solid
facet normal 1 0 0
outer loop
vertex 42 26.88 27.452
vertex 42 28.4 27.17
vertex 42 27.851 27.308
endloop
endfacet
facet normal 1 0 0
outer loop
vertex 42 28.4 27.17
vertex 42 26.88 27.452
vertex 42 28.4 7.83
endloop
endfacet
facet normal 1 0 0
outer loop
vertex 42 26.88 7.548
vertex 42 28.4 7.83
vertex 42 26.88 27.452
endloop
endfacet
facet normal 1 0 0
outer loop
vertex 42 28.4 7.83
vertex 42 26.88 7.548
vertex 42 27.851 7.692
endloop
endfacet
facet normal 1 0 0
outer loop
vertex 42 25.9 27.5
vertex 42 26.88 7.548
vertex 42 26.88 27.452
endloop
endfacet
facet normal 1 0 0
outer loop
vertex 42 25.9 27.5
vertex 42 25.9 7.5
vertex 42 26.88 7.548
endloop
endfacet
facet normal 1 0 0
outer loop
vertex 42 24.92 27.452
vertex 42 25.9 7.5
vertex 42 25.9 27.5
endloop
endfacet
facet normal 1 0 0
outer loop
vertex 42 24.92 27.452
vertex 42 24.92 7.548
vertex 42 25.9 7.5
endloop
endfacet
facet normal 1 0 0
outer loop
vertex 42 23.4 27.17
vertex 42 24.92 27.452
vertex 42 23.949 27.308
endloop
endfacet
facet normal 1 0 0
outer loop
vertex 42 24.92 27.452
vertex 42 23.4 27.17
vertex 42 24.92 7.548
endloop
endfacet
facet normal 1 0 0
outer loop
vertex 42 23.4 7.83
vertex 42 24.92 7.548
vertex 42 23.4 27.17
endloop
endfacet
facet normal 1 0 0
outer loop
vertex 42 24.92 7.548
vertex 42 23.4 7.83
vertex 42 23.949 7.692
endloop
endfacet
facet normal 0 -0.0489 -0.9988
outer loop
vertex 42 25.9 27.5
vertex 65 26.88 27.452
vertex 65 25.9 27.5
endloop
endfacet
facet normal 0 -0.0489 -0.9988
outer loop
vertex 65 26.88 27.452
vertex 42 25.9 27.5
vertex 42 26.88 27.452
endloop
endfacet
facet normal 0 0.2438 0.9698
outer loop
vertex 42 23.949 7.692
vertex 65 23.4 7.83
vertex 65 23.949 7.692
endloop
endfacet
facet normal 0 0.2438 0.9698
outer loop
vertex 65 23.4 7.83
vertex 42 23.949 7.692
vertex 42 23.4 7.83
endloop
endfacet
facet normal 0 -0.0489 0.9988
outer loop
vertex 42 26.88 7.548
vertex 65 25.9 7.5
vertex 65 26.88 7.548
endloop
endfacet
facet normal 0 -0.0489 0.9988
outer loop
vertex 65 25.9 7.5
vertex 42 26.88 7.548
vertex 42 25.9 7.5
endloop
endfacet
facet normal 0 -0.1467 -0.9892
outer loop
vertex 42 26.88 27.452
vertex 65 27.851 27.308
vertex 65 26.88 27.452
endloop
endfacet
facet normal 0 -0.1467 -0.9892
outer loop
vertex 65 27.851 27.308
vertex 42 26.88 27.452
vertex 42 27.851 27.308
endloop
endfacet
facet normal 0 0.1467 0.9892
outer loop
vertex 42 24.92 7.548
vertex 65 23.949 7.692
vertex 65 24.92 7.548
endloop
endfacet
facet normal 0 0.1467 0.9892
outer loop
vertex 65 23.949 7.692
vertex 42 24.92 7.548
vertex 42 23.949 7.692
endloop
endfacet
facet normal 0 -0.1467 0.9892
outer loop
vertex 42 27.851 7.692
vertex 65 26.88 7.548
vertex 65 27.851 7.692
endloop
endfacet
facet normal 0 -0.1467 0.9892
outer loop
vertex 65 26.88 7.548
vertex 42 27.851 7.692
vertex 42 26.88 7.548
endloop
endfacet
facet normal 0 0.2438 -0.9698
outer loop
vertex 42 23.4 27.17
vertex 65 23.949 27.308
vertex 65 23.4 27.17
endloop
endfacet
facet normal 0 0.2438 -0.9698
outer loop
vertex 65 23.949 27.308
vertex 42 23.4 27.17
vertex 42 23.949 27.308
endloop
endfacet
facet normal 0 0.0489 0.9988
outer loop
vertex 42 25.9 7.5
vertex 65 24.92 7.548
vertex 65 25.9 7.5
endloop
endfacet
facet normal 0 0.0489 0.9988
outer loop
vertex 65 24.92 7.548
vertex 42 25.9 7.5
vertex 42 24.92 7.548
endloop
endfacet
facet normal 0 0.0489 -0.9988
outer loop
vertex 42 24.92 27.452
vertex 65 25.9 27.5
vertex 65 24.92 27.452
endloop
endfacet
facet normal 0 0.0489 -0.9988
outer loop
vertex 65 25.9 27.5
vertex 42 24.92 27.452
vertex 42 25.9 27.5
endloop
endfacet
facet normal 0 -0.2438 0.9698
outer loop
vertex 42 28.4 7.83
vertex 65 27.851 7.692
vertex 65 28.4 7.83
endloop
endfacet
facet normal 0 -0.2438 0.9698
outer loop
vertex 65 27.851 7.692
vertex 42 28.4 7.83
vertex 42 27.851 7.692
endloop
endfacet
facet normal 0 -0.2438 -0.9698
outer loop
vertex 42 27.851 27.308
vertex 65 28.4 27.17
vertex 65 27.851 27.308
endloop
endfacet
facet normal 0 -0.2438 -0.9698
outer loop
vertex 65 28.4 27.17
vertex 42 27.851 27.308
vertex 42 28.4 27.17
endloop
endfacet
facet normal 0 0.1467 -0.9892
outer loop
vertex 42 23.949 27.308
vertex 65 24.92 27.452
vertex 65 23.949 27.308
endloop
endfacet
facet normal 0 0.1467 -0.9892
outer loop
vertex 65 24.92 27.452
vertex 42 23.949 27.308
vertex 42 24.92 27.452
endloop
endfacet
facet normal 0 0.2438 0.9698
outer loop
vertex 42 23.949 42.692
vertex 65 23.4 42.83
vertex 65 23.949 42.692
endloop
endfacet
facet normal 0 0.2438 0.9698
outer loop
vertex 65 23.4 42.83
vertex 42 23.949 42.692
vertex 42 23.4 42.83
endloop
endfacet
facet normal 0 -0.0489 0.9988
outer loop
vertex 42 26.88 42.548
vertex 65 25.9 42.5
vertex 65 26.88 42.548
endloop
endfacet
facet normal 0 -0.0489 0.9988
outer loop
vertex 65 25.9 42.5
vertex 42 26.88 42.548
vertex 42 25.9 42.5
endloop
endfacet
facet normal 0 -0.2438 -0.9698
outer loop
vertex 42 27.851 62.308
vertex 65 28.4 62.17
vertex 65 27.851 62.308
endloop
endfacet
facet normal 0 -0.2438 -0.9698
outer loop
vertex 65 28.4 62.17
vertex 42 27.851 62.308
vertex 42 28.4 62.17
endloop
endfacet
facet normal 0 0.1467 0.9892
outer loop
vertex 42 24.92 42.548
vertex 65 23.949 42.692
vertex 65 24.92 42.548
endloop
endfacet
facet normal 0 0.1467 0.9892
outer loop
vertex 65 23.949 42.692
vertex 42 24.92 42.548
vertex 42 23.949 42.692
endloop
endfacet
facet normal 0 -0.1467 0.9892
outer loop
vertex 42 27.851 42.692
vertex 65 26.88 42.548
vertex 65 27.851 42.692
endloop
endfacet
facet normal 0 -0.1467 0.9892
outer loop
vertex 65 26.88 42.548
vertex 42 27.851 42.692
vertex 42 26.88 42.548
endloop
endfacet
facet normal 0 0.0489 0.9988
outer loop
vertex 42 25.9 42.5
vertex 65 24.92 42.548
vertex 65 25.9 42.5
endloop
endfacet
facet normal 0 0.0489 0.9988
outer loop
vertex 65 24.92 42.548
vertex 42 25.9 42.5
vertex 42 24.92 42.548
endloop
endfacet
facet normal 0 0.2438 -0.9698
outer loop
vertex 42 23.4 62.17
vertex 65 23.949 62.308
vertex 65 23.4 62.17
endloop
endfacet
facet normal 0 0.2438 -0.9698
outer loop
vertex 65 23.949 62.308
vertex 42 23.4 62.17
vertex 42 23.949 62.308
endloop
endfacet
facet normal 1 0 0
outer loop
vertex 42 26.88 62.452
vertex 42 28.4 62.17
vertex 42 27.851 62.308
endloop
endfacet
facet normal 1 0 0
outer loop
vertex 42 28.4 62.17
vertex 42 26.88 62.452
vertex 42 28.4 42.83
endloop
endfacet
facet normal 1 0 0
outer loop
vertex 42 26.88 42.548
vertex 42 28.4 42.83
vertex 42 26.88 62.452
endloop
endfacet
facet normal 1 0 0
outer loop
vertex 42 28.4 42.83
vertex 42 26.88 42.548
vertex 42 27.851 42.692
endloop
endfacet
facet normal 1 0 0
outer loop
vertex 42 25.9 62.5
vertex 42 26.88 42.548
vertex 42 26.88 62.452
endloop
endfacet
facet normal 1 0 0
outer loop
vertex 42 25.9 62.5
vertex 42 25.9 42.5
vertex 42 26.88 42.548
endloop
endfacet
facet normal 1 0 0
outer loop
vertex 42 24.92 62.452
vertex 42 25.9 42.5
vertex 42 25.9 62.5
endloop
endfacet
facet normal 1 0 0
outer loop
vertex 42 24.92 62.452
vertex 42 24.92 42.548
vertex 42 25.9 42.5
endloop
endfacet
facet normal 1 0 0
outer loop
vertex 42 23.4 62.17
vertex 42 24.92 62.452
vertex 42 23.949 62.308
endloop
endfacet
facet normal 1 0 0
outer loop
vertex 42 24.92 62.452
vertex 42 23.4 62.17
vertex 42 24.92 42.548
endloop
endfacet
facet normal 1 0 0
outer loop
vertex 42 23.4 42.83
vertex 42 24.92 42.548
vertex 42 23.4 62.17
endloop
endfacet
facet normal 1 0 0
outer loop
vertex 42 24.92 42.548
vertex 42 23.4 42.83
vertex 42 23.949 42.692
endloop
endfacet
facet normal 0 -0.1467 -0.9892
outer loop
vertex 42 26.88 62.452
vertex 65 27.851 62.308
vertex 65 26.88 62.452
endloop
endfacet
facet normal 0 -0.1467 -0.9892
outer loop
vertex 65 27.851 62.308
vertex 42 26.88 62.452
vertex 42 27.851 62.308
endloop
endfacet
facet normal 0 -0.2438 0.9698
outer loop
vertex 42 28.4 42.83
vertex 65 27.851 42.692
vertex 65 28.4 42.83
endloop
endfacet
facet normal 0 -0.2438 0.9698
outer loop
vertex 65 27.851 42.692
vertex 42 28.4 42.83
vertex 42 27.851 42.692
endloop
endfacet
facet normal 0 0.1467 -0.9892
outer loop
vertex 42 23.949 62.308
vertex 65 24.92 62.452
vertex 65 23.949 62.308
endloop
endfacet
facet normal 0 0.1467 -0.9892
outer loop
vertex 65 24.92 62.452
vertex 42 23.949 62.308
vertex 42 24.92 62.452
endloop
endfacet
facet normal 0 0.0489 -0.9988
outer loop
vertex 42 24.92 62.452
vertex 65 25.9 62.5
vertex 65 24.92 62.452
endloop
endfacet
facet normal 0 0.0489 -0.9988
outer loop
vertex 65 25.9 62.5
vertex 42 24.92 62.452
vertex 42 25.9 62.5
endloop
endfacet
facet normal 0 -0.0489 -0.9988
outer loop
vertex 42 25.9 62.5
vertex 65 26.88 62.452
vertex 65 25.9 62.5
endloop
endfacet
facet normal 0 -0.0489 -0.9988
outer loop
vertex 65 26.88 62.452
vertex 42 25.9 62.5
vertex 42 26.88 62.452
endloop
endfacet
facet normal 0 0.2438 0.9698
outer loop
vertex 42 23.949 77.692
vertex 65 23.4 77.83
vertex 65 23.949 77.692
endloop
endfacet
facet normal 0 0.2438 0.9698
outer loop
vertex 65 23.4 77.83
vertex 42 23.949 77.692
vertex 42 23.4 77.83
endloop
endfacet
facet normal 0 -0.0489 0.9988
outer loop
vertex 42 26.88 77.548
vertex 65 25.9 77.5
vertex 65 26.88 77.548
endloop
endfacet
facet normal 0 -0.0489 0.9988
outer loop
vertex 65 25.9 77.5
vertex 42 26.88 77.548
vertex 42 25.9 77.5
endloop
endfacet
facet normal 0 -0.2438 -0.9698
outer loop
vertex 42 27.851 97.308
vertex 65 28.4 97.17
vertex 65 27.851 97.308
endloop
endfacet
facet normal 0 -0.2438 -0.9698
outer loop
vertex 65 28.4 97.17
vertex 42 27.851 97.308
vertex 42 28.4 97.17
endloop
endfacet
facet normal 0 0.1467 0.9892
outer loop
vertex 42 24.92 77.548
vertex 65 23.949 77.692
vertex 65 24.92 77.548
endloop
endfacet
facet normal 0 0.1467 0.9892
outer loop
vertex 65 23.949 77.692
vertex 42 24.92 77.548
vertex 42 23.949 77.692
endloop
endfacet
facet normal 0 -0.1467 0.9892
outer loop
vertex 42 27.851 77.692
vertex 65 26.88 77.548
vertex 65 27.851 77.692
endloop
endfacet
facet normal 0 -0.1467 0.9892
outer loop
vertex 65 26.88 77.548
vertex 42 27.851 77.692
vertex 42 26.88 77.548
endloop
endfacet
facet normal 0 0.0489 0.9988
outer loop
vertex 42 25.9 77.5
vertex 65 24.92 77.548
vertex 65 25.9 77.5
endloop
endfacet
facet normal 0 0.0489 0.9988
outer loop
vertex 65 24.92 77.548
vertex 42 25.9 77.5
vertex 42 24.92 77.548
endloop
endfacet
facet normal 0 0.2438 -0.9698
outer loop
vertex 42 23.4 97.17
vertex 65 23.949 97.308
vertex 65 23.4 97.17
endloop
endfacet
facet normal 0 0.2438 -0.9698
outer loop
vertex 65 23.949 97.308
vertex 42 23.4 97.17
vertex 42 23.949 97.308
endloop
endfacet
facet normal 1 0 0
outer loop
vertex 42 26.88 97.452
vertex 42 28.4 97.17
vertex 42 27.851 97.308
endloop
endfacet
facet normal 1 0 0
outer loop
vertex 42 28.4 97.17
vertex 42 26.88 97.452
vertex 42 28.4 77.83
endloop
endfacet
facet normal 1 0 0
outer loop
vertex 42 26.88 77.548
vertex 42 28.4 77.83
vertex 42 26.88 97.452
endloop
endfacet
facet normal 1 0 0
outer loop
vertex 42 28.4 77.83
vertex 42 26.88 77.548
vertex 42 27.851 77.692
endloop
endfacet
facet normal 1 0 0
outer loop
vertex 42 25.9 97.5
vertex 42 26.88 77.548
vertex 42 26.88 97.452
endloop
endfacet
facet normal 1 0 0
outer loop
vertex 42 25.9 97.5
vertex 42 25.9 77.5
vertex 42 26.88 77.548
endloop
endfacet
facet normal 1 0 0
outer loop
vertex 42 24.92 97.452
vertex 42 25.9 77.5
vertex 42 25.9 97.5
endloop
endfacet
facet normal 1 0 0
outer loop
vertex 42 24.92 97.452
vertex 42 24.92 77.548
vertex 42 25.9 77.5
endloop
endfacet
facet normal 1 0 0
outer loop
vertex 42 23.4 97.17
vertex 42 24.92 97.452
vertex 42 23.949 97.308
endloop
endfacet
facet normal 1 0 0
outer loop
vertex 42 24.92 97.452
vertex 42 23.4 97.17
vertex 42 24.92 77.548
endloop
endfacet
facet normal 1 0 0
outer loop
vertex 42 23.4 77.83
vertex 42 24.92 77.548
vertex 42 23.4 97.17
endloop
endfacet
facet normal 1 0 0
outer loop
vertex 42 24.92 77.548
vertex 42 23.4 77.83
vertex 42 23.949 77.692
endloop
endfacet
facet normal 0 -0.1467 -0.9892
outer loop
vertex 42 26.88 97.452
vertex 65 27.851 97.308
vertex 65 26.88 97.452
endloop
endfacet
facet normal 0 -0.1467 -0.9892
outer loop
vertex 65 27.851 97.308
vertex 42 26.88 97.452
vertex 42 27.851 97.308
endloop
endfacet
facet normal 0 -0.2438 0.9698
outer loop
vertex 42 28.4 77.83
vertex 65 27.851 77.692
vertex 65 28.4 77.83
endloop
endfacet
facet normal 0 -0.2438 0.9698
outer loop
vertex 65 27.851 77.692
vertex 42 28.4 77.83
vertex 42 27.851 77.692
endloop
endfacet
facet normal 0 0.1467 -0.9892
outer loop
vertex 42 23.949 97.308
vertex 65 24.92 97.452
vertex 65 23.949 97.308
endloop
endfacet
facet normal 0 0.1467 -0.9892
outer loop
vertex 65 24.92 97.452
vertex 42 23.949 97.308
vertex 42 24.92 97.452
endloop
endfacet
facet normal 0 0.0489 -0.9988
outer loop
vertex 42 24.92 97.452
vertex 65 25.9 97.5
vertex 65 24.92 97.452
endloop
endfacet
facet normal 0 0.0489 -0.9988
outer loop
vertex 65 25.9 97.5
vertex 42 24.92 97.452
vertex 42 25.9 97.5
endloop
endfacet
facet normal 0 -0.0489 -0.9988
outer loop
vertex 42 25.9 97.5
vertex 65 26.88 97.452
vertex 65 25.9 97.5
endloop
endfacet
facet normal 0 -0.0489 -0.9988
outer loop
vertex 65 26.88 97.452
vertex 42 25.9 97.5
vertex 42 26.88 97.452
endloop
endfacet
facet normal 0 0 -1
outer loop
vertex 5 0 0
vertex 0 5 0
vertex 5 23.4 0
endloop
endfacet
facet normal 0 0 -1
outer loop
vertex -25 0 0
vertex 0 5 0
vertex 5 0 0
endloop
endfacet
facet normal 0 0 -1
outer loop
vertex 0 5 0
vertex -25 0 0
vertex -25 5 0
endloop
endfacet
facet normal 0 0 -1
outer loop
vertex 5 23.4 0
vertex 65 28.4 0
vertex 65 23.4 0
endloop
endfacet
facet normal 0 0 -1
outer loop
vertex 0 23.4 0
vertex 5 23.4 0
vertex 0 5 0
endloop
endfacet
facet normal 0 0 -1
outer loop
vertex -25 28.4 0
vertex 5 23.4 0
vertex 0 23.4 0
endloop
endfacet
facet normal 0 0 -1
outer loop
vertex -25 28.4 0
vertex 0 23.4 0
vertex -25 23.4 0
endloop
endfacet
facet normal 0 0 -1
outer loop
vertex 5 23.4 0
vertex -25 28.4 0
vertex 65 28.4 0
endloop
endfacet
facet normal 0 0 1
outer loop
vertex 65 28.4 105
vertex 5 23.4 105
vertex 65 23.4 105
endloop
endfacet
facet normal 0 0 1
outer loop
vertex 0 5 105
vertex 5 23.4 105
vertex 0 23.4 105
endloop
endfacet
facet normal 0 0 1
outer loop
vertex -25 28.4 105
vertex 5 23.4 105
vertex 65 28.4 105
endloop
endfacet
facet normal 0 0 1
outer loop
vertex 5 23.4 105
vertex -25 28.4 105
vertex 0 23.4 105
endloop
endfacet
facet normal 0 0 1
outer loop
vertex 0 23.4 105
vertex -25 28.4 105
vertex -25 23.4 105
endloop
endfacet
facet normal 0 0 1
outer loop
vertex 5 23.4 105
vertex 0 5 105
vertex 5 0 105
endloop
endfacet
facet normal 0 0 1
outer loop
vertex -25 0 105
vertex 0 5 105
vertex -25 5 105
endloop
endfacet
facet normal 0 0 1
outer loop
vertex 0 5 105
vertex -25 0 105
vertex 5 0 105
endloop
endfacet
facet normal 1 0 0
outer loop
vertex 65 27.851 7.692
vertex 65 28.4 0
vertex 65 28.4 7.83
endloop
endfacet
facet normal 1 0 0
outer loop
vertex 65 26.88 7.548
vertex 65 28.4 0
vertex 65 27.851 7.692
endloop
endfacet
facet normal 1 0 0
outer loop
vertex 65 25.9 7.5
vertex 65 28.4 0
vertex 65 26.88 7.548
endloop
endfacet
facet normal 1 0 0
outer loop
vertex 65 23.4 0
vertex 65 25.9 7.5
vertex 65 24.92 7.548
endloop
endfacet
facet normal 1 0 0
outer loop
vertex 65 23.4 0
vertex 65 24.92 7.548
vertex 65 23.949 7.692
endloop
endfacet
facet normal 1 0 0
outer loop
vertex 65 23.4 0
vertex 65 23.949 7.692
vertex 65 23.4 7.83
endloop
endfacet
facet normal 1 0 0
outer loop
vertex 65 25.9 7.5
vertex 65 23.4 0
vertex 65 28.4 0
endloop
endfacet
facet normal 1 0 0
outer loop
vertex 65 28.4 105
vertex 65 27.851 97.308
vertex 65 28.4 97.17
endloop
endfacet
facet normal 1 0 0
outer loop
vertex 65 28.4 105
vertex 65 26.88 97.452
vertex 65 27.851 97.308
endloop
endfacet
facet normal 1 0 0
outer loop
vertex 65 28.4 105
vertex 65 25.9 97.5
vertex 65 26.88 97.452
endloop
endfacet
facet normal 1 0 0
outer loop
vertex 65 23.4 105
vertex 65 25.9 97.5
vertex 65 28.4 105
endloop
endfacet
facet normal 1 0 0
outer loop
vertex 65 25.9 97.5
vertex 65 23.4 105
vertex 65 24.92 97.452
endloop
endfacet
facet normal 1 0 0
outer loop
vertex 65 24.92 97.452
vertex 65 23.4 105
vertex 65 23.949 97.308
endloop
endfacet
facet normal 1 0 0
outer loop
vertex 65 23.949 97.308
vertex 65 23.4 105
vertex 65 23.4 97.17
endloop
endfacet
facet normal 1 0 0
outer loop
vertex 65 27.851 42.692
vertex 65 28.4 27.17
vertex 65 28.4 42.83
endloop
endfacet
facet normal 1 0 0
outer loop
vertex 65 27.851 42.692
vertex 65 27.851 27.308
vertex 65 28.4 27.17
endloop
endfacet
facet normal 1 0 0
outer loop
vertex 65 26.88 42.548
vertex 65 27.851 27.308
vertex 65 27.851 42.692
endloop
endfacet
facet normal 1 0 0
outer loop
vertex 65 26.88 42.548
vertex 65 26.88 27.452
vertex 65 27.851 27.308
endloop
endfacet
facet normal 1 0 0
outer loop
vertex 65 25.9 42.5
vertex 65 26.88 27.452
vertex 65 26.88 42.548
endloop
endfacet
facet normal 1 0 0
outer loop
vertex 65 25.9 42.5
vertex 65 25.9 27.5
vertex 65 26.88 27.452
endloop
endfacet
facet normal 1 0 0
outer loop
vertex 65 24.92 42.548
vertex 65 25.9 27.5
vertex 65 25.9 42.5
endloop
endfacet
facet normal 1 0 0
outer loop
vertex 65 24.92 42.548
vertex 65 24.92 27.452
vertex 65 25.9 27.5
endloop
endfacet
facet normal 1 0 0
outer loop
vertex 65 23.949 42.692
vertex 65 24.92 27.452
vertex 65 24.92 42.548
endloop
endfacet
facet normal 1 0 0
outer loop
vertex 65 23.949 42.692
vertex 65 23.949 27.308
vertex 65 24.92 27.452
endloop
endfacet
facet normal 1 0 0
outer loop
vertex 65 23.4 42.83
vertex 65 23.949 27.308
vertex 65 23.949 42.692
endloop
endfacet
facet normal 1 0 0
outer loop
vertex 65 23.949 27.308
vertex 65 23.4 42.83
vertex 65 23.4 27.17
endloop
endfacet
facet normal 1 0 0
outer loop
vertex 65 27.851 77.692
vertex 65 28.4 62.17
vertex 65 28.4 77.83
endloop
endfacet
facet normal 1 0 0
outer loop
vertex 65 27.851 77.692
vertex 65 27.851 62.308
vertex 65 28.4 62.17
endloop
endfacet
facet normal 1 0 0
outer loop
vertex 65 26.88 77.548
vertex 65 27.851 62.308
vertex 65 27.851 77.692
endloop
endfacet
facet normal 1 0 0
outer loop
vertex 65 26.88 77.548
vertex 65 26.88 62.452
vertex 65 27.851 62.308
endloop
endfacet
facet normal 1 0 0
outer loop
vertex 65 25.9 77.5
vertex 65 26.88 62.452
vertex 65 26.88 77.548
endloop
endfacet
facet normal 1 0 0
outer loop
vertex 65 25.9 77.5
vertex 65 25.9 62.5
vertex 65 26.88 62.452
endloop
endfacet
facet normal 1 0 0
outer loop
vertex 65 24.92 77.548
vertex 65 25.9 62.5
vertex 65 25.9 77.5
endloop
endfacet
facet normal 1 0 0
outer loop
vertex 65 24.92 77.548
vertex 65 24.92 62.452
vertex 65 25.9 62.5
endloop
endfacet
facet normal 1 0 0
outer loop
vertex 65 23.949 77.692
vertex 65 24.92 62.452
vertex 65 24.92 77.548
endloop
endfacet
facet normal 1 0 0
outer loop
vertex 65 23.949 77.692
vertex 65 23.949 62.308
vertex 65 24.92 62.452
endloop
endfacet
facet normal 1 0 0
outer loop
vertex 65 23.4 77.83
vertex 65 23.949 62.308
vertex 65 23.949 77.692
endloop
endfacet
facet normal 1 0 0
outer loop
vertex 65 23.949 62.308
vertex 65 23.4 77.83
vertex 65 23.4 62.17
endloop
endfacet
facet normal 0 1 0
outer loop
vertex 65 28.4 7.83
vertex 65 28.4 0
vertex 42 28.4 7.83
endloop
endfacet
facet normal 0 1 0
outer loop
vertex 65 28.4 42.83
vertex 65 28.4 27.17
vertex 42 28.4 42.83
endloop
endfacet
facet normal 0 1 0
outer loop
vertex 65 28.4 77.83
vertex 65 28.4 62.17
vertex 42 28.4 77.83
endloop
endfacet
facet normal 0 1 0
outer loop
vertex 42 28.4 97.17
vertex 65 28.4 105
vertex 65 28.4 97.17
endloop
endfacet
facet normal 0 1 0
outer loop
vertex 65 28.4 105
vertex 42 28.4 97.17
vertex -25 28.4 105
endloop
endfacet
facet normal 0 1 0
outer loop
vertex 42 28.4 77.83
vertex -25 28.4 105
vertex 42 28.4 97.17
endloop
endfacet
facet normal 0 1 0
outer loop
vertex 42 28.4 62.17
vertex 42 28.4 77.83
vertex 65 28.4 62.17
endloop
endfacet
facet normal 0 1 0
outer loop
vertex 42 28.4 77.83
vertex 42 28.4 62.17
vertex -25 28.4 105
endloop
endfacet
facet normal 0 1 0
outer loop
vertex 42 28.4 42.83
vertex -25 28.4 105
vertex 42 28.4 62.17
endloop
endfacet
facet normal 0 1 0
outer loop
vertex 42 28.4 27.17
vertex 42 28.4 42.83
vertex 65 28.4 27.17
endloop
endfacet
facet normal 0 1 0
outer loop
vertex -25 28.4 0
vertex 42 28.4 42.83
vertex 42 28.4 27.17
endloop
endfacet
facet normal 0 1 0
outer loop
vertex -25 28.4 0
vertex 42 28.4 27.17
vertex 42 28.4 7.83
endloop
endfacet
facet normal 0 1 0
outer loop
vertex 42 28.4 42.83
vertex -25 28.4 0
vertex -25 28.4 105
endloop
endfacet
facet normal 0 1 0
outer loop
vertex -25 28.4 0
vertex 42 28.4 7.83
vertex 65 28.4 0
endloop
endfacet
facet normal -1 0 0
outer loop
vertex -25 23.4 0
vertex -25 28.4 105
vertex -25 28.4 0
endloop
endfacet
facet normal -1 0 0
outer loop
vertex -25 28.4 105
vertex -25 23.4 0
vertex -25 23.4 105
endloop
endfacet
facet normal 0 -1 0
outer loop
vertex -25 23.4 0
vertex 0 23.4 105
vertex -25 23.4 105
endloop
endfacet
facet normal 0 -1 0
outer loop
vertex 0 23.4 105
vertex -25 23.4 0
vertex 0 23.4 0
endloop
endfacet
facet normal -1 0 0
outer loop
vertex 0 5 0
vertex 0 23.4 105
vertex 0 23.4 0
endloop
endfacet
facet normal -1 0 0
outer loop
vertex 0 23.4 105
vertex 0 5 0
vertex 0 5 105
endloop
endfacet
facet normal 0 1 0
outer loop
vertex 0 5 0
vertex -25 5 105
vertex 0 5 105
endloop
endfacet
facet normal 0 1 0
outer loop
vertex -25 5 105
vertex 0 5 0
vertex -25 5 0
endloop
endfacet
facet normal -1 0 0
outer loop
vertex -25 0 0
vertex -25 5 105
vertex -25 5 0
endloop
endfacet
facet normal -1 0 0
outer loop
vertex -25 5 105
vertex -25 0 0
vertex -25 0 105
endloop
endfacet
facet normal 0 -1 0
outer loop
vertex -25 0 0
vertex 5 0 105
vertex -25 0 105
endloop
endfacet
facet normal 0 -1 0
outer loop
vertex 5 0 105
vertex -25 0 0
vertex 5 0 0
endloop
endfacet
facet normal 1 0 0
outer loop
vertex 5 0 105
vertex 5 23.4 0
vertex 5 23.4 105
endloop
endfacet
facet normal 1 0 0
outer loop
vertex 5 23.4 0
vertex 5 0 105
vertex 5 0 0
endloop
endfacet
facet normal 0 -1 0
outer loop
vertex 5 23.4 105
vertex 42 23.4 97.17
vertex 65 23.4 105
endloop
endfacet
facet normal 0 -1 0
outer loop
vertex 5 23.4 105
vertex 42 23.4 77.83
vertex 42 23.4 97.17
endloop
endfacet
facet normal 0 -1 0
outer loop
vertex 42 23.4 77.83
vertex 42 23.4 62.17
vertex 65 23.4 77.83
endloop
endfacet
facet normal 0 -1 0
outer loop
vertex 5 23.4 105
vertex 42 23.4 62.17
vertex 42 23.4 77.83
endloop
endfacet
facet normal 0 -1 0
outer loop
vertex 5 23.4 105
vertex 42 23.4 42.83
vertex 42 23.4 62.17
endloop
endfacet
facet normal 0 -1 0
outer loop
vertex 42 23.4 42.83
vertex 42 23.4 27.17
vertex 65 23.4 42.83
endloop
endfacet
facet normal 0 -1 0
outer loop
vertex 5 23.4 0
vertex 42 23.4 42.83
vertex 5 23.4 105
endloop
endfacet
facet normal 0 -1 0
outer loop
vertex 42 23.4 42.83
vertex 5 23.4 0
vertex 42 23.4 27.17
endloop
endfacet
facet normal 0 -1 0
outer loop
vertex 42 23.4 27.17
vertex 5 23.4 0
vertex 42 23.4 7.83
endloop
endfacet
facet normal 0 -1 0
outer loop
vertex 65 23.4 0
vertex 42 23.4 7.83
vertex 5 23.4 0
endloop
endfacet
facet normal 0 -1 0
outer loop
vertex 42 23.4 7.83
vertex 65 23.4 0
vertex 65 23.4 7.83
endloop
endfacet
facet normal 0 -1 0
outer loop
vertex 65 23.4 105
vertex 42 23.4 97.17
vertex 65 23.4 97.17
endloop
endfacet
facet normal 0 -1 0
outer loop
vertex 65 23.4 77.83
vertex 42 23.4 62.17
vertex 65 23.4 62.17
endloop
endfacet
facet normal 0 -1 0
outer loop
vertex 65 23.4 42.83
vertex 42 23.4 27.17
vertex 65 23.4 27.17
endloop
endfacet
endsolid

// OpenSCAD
// Pipette Holder Clamp
// Designed for an 18mm shelf.
// Printed lying on its side (XY plane is the profile, Z is the extrusion/length).

// --- Dimensions ---
shelf_thickness = 18.0;
spine_x_end     = 5.0;
spine_y_end     = 28.4;

bottom_jaw_x_start = -25.0;
bottom_jaw_x_end   = 5.0;
bottom_jaw_y_end    = 5.0;

top_jaw_x_start    = -25.0;
top_jaw_x_end      = 65.0;
top_jaw_y_start     = 23.4;
top_jaw_y_end       = 28.4;

extrusion_length    = 105.0;
hole_diameter       = 20.0;
hole_x_pos          = 42.0;
hole_z_pos_1        = 17.5;
hole_z_pos_2        = 52.5;
hole_z_pos_3        = 87.5;

$fn = 64;

// --- Geometry Construction ---

module profile() {
    union() {
        // Spine (back vertical part)
        square([spine_x_end, spine_y_end]);
        
        // Bottom Jaw
        translate([bottom_jaw_x_start, 0]) 
            square([bottom_jaw_x_end - bottom_jaw_x_start, bottom_jaw_y_end]);
        
        // Top Jaw and Arm
        translate([top_jaw_x_start, top_jaw_y_start]) 
            square([top_jaw_x_end - top_jaw_x_start, top_jaw_y_end - top_jaw_y_start]);
    }
}

difference() {
    // The main extruded body
    linear_extrude(height = extrusion_length) {
        profile();
    }

    // The three pipette holes
    // Holes are centered at x = 42 and specific Z positions.
    // They go through the arm along the Y axis.
    // To ensure they cut through, we center them at the Y-midpoint of the arm.
    // Arm Y-midpoint = (23.4 + 28.4) / 2 = 25.9
    for (z_pos = [hole_z_pos_1, hole_z_pos_2, hole_z_pos_3]) {
        translate([hole_x_pos, (top_jaw_y_start + top_jaw_y_end) / 2, z_pos])
        rotate([0, 90, 0]) 
        cylinder(h = 100, d = hole_diameter); 
    }
}
